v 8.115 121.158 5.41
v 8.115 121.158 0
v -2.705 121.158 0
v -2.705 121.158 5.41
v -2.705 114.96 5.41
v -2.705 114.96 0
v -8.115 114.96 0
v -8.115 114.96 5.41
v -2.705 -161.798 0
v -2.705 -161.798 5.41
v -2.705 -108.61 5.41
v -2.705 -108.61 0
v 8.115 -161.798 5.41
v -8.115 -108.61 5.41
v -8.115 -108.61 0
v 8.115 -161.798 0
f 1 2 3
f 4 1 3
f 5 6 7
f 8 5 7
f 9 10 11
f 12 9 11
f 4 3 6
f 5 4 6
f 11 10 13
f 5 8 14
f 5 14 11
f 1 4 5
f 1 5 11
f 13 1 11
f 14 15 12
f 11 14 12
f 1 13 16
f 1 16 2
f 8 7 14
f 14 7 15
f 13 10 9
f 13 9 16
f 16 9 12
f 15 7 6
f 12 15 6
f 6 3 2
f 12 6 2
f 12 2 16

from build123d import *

# Parameters (mm, degrees)
BOSS_EXTRUDE1_DEPTH = 5.4102
SKETCH2_W           = 10.8204
SKETCH2_H           = 40.64
BOSS_EXTRUDE2_DEPTH = 5.4102


with BuildPart() as part:
    # Sketch1 → Boss-Extrude1 (new body)
    with BuildSketch(Plane.XY):
        Polygon((-2.7051, -108.6104), (-2.7051, -121.158), (8.1153, -121.158), (8.1153, 121.158), (-2.7051, 121.158), (-2.7051, 114.9604), (-8.1153, 114.9604), (-8.1153, -108.6104), align=None)
    extrude(amount=BOSS_EXTRUDE1_DEPTH)

    # Sketch2 → Boss-Extrude2 (add)
    with BuildSketch(Plane.XY.offset(5.4102)):
        with Locations((2.7051, -141.478)):
            Rectangle(SKETCH2_W, SKETCH2_H)
    extrude(amount=-BOSS_EXTRUDE2_DEPTH)


solid = part.part
